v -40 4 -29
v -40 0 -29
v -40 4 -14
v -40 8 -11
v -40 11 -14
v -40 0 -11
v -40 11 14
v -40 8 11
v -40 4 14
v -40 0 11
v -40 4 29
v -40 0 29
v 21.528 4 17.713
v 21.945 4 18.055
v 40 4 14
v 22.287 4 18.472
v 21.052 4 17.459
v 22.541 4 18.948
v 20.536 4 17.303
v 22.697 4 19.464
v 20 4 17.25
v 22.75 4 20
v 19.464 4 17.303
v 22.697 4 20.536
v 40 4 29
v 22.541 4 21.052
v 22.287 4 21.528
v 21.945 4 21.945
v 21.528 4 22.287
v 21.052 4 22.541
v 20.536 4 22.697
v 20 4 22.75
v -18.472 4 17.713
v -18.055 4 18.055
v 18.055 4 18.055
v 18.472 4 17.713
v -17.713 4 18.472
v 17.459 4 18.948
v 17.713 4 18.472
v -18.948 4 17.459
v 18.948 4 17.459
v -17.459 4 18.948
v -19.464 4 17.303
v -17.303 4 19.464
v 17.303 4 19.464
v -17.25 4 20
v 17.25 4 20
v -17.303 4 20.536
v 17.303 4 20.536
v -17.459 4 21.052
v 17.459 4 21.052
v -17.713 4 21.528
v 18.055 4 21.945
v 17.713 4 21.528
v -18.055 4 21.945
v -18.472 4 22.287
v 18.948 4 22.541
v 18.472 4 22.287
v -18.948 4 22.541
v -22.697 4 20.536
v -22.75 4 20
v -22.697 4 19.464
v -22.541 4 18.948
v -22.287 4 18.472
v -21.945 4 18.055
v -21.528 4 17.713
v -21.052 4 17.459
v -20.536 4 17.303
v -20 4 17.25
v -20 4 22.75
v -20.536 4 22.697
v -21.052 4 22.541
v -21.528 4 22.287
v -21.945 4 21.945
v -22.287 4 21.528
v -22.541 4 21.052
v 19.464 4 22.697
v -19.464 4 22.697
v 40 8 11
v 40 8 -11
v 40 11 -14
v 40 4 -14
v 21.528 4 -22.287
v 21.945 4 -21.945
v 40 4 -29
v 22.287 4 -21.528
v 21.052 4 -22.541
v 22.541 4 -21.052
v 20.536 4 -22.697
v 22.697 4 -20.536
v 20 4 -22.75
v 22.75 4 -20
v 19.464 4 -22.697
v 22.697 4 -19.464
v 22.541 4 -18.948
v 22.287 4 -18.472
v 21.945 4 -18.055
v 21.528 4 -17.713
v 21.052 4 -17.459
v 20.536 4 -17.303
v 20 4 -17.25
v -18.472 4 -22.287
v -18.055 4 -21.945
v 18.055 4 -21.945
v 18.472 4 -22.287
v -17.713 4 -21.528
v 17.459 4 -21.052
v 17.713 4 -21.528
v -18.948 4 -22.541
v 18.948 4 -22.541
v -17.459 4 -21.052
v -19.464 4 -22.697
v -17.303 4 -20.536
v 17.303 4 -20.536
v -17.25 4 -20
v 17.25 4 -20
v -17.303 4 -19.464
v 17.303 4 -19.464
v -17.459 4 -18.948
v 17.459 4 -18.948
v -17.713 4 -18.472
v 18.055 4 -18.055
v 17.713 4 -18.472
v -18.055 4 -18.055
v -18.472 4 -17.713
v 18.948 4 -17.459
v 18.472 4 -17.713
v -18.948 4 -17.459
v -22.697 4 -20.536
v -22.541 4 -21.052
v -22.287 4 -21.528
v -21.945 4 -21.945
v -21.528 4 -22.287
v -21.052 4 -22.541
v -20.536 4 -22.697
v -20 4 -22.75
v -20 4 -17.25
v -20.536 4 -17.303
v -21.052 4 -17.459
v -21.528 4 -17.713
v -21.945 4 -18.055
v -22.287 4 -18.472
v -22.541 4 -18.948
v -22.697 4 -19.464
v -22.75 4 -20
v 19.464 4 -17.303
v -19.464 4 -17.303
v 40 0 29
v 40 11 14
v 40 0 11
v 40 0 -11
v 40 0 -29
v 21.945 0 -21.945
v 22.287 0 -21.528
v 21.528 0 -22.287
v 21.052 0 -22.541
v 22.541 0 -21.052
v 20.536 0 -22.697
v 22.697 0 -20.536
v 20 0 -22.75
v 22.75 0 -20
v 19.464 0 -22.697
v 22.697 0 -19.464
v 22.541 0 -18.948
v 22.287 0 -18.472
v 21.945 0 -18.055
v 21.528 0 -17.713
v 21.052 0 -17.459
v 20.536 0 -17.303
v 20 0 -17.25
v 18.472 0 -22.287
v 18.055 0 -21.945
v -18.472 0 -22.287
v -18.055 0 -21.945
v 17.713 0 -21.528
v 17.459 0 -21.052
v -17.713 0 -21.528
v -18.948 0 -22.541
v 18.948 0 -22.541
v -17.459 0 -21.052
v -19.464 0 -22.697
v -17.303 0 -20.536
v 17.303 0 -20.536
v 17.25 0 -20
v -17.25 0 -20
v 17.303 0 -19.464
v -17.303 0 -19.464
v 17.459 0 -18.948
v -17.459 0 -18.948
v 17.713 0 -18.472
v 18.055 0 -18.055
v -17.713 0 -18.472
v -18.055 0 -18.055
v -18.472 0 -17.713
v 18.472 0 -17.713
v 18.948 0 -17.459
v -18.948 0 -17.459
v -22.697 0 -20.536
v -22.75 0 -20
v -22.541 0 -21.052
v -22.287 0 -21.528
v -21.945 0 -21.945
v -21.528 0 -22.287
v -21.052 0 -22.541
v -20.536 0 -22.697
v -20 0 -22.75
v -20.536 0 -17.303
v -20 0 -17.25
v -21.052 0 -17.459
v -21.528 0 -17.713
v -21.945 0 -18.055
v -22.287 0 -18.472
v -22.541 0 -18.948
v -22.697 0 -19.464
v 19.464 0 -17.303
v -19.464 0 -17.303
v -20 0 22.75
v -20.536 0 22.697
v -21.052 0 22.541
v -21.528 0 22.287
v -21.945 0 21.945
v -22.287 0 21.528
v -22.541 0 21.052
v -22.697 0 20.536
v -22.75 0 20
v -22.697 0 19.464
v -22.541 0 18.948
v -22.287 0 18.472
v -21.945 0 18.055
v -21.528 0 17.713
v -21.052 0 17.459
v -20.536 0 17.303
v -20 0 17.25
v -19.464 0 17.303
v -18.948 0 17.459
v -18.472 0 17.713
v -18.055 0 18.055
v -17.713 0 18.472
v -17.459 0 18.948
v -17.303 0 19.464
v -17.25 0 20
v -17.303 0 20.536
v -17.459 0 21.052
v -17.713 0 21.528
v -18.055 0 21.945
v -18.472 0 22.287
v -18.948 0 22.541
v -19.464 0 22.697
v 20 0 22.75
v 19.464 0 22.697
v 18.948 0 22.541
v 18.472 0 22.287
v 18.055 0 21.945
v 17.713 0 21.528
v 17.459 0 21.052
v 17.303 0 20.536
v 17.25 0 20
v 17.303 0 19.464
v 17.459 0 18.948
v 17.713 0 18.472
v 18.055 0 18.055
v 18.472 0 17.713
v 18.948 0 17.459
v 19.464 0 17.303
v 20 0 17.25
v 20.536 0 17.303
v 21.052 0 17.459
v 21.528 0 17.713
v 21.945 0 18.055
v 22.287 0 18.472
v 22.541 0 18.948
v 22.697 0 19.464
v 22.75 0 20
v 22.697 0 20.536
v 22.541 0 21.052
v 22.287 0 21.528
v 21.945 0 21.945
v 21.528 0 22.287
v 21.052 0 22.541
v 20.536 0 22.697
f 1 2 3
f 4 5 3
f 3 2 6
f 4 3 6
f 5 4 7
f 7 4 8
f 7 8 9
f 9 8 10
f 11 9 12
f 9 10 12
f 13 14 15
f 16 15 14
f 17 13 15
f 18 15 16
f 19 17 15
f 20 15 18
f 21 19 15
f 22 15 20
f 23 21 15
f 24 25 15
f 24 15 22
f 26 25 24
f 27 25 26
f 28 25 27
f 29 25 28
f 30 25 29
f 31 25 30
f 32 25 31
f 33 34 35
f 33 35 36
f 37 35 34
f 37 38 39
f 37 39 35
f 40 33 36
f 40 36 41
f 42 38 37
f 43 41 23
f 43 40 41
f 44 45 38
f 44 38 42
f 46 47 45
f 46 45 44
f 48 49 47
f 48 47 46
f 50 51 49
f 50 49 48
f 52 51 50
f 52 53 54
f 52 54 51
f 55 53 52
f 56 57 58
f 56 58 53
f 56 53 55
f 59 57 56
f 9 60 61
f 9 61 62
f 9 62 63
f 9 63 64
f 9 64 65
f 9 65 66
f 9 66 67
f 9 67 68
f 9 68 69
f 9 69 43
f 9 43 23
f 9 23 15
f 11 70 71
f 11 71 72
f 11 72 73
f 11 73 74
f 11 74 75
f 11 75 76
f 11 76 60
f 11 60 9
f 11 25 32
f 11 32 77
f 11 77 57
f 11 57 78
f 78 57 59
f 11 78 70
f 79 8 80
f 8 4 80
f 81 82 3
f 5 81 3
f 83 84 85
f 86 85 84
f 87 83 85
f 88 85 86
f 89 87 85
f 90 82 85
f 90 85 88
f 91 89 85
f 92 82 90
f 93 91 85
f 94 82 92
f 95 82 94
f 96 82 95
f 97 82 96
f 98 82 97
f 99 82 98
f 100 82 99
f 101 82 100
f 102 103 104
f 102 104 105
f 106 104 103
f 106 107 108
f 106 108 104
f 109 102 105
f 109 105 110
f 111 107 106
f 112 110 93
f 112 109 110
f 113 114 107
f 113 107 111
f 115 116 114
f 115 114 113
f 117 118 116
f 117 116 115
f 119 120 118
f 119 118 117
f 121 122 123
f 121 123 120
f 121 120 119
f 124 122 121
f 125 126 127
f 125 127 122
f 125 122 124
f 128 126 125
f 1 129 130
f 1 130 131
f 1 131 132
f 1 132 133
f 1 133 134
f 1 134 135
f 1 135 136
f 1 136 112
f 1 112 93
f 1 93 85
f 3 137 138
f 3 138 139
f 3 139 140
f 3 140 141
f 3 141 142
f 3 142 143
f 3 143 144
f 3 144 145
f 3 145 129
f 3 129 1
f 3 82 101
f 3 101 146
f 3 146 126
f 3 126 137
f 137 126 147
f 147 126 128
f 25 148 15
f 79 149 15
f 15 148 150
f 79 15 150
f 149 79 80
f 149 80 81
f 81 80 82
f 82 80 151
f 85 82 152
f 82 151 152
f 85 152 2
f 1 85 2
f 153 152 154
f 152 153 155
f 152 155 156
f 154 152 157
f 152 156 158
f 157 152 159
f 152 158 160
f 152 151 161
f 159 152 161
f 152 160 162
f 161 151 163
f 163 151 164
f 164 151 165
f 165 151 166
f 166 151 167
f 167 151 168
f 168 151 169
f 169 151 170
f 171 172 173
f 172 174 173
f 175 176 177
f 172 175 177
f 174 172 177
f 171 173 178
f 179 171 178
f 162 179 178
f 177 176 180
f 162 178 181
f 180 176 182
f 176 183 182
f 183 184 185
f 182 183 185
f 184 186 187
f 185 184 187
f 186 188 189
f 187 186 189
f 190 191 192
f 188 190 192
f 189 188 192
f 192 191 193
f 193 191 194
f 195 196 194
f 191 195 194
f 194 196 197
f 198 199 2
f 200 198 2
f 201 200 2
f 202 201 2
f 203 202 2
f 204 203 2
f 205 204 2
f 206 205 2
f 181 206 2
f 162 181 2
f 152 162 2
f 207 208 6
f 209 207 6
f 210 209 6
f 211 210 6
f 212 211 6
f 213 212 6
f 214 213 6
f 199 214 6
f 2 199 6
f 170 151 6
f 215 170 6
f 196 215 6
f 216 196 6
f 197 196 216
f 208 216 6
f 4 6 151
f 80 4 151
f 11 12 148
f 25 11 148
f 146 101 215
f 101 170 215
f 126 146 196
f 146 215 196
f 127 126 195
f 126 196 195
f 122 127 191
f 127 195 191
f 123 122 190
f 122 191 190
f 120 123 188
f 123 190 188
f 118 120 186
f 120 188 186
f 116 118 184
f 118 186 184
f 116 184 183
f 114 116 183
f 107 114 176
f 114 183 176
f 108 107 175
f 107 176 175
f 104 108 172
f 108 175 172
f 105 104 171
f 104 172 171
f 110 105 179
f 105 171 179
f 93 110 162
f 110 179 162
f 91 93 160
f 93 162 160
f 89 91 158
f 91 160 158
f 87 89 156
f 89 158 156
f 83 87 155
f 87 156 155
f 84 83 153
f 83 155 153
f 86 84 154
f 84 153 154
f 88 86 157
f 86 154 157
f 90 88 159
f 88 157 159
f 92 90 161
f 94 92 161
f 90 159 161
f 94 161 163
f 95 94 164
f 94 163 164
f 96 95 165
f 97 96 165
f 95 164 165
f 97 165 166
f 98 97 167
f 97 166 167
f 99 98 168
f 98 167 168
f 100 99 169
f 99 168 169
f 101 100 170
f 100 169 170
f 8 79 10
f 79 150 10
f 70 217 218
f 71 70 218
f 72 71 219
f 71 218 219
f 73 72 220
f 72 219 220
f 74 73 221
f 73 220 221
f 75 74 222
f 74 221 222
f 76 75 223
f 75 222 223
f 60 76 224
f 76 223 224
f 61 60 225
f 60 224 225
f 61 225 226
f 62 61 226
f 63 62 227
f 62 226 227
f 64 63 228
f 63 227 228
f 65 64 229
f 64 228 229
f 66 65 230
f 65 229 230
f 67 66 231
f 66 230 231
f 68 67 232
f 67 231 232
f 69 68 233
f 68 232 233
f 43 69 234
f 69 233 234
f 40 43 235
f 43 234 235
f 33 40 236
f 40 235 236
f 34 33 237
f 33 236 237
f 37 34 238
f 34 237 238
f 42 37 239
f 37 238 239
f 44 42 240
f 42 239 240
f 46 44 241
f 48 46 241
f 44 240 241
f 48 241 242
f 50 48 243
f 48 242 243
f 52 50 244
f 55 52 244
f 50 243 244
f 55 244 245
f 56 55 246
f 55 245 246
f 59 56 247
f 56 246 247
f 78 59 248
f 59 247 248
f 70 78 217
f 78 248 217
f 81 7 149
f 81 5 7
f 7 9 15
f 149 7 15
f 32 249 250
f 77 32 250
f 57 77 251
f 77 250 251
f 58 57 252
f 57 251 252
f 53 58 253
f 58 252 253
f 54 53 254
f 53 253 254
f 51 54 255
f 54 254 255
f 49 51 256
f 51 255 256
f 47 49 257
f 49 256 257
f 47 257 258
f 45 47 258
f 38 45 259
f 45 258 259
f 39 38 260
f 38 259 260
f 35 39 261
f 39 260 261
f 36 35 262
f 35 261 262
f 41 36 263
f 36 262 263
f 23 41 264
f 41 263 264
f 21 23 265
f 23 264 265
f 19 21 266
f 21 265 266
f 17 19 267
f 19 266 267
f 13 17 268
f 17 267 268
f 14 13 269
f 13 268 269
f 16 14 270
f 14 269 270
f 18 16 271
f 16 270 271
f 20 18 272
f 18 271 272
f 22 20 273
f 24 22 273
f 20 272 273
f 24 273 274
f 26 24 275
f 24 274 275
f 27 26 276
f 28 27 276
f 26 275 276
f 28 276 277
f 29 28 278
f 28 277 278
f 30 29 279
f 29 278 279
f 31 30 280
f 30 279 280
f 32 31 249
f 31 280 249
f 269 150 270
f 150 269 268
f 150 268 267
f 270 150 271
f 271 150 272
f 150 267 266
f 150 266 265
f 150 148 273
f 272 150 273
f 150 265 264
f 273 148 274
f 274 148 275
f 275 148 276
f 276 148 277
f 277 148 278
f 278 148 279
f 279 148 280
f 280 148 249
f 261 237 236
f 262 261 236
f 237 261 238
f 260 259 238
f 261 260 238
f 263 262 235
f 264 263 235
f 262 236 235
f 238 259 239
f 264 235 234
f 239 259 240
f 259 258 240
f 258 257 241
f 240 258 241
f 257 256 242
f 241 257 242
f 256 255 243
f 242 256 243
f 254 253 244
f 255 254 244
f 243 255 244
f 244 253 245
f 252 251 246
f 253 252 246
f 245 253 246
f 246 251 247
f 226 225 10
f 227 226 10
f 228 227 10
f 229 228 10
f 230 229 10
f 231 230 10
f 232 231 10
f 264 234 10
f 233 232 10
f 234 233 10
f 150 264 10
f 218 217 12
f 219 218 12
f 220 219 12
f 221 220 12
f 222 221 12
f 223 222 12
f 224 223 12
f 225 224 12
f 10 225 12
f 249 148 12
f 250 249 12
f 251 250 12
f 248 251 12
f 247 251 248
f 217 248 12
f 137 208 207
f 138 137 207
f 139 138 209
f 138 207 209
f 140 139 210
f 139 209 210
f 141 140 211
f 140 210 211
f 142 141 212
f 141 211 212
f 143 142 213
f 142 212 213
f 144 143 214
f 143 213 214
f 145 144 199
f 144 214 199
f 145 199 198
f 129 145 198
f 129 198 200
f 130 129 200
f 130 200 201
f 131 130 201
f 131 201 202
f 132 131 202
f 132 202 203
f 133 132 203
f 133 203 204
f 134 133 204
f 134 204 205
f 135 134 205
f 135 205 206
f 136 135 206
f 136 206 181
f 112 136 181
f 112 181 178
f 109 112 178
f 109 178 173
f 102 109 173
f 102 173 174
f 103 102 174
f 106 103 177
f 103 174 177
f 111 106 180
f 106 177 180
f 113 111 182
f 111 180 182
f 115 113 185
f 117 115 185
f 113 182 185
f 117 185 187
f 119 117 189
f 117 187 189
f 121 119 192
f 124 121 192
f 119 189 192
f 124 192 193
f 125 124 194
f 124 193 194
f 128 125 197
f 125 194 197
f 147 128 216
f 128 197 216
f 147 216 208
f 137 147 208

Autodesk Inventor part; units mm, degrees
ref_plane "YZ Plane" through (0, 0, 0) normal (1, 0, 0) x (0, 1, 0)
ref_plane "XZ Plane" through (0, 0, 0) normal (0, 1, 0) x (-1, 0, 0)
ref_plane "XY Plane" through (0, 0, 0) normal (0, 0, 1) x (1, 0, 0)
sketch "Sketch1" plane through (0, 0, 0) normal (0, 1, 0) x (-1, 0, 0)
  line L0 (40, 29) -> (-40, 29)
  line L1 (-40, 29) -> (-40, 11)
  line L2 (-40, 11) -> (40, 11)
  line L3 (40, 11) -> (40, 29)
  line L4 (40, -11) -> (-40, -11)
  line L5 (-40, -11) -> (-40, -29)
  line L6 (-40, -29) -> (40, -29)
  line L7 (40, -29) -> (40, -11)
  line L8 (40, 11) -> (40, -11) construction
  point P0 (0, 0)
  point P1 (40, 0)
  point P2 (0, 29)
  dimension "d0" = 58
  dimension "d1" = 18
  dimension "d2" = 80
extrude "Extrusion1" add sketch "Sketch1" along normal blind 4
sketch "Sketch2" plane through (0, 4, 0) normal (0, 1, 0) x (1, 0, 0)
  line L0 (40, -29) -> (40, -11) projected
  line L1 (-40, -11) -> (40, -11)
  line L2 (40, -11) -> (40, -14)
  line L3 (40, -14) -> (-40, -14)
  line L4 (-40, -14) -> (-40, -11)
  line L5 (40, 11) -> (40, 29) projected
  line L6 (-40, 11) -> (40, 11)
  line L7 (40, 11) -> (40, 14)
  line L8 (40, 14) -> (-40, 14)
  line L9 (-40, 14) -> (-40, 11)
  point P0 (0, 0)
  dimension "d5" = 3
  dimension "d6" = 3
extrude "Extrusion2" add sketch "Sketch2" along normal blind 4
sketch "Sketch3" plane through (0, 8, 0) normal (0, 1, 0) x (1, 0, 0)
  line L0 (-40, -14) -> (40, -14) projected
  line L1 (40, 11) -> (40, 29) projected
  line L2 (-40, -14) -> (40, -14)
  line L3 (40, -14) -> (40, 14)
  line L4 (40, 14) -> (-40, 14)
  line L5 (-40, 14) -> (-40, -14)
  point P0 (0, 0)
extrude "Extrusion3" add sketch "Sketch3" along normal blind 3
sketch "Sketch4" plane through (0, 4, 0) normal (0, 1, 0) x (1, 0, 0)
  line L0 (-40, -29) -> (40, -29) projected
  line L1 (40, 29) -> (-40, 29) projected
  line L2 (-40, 29) -> (-40, 14) projected
  line L3 (40, 14) -> (40, 29) projected
  point P0 (0, 0)
  point P1 (-20, -20)
  point P2 (20, -20)
  point P3 (-20, 20)
  point P4 (20, 20)
  dimension "d12" = 9
  dimension "d13" = 9
  dimension "d14" = 20
  dimension "d15" = 20
hole "Hole1" at (-20, 4, 20) at (20, 4, 20) at (-20, 4, -20) at (20, 4, -20) direction (0, -1, 0) diameter 5.5 end through all
properties part number "Main Carriage - Wheel Base"
